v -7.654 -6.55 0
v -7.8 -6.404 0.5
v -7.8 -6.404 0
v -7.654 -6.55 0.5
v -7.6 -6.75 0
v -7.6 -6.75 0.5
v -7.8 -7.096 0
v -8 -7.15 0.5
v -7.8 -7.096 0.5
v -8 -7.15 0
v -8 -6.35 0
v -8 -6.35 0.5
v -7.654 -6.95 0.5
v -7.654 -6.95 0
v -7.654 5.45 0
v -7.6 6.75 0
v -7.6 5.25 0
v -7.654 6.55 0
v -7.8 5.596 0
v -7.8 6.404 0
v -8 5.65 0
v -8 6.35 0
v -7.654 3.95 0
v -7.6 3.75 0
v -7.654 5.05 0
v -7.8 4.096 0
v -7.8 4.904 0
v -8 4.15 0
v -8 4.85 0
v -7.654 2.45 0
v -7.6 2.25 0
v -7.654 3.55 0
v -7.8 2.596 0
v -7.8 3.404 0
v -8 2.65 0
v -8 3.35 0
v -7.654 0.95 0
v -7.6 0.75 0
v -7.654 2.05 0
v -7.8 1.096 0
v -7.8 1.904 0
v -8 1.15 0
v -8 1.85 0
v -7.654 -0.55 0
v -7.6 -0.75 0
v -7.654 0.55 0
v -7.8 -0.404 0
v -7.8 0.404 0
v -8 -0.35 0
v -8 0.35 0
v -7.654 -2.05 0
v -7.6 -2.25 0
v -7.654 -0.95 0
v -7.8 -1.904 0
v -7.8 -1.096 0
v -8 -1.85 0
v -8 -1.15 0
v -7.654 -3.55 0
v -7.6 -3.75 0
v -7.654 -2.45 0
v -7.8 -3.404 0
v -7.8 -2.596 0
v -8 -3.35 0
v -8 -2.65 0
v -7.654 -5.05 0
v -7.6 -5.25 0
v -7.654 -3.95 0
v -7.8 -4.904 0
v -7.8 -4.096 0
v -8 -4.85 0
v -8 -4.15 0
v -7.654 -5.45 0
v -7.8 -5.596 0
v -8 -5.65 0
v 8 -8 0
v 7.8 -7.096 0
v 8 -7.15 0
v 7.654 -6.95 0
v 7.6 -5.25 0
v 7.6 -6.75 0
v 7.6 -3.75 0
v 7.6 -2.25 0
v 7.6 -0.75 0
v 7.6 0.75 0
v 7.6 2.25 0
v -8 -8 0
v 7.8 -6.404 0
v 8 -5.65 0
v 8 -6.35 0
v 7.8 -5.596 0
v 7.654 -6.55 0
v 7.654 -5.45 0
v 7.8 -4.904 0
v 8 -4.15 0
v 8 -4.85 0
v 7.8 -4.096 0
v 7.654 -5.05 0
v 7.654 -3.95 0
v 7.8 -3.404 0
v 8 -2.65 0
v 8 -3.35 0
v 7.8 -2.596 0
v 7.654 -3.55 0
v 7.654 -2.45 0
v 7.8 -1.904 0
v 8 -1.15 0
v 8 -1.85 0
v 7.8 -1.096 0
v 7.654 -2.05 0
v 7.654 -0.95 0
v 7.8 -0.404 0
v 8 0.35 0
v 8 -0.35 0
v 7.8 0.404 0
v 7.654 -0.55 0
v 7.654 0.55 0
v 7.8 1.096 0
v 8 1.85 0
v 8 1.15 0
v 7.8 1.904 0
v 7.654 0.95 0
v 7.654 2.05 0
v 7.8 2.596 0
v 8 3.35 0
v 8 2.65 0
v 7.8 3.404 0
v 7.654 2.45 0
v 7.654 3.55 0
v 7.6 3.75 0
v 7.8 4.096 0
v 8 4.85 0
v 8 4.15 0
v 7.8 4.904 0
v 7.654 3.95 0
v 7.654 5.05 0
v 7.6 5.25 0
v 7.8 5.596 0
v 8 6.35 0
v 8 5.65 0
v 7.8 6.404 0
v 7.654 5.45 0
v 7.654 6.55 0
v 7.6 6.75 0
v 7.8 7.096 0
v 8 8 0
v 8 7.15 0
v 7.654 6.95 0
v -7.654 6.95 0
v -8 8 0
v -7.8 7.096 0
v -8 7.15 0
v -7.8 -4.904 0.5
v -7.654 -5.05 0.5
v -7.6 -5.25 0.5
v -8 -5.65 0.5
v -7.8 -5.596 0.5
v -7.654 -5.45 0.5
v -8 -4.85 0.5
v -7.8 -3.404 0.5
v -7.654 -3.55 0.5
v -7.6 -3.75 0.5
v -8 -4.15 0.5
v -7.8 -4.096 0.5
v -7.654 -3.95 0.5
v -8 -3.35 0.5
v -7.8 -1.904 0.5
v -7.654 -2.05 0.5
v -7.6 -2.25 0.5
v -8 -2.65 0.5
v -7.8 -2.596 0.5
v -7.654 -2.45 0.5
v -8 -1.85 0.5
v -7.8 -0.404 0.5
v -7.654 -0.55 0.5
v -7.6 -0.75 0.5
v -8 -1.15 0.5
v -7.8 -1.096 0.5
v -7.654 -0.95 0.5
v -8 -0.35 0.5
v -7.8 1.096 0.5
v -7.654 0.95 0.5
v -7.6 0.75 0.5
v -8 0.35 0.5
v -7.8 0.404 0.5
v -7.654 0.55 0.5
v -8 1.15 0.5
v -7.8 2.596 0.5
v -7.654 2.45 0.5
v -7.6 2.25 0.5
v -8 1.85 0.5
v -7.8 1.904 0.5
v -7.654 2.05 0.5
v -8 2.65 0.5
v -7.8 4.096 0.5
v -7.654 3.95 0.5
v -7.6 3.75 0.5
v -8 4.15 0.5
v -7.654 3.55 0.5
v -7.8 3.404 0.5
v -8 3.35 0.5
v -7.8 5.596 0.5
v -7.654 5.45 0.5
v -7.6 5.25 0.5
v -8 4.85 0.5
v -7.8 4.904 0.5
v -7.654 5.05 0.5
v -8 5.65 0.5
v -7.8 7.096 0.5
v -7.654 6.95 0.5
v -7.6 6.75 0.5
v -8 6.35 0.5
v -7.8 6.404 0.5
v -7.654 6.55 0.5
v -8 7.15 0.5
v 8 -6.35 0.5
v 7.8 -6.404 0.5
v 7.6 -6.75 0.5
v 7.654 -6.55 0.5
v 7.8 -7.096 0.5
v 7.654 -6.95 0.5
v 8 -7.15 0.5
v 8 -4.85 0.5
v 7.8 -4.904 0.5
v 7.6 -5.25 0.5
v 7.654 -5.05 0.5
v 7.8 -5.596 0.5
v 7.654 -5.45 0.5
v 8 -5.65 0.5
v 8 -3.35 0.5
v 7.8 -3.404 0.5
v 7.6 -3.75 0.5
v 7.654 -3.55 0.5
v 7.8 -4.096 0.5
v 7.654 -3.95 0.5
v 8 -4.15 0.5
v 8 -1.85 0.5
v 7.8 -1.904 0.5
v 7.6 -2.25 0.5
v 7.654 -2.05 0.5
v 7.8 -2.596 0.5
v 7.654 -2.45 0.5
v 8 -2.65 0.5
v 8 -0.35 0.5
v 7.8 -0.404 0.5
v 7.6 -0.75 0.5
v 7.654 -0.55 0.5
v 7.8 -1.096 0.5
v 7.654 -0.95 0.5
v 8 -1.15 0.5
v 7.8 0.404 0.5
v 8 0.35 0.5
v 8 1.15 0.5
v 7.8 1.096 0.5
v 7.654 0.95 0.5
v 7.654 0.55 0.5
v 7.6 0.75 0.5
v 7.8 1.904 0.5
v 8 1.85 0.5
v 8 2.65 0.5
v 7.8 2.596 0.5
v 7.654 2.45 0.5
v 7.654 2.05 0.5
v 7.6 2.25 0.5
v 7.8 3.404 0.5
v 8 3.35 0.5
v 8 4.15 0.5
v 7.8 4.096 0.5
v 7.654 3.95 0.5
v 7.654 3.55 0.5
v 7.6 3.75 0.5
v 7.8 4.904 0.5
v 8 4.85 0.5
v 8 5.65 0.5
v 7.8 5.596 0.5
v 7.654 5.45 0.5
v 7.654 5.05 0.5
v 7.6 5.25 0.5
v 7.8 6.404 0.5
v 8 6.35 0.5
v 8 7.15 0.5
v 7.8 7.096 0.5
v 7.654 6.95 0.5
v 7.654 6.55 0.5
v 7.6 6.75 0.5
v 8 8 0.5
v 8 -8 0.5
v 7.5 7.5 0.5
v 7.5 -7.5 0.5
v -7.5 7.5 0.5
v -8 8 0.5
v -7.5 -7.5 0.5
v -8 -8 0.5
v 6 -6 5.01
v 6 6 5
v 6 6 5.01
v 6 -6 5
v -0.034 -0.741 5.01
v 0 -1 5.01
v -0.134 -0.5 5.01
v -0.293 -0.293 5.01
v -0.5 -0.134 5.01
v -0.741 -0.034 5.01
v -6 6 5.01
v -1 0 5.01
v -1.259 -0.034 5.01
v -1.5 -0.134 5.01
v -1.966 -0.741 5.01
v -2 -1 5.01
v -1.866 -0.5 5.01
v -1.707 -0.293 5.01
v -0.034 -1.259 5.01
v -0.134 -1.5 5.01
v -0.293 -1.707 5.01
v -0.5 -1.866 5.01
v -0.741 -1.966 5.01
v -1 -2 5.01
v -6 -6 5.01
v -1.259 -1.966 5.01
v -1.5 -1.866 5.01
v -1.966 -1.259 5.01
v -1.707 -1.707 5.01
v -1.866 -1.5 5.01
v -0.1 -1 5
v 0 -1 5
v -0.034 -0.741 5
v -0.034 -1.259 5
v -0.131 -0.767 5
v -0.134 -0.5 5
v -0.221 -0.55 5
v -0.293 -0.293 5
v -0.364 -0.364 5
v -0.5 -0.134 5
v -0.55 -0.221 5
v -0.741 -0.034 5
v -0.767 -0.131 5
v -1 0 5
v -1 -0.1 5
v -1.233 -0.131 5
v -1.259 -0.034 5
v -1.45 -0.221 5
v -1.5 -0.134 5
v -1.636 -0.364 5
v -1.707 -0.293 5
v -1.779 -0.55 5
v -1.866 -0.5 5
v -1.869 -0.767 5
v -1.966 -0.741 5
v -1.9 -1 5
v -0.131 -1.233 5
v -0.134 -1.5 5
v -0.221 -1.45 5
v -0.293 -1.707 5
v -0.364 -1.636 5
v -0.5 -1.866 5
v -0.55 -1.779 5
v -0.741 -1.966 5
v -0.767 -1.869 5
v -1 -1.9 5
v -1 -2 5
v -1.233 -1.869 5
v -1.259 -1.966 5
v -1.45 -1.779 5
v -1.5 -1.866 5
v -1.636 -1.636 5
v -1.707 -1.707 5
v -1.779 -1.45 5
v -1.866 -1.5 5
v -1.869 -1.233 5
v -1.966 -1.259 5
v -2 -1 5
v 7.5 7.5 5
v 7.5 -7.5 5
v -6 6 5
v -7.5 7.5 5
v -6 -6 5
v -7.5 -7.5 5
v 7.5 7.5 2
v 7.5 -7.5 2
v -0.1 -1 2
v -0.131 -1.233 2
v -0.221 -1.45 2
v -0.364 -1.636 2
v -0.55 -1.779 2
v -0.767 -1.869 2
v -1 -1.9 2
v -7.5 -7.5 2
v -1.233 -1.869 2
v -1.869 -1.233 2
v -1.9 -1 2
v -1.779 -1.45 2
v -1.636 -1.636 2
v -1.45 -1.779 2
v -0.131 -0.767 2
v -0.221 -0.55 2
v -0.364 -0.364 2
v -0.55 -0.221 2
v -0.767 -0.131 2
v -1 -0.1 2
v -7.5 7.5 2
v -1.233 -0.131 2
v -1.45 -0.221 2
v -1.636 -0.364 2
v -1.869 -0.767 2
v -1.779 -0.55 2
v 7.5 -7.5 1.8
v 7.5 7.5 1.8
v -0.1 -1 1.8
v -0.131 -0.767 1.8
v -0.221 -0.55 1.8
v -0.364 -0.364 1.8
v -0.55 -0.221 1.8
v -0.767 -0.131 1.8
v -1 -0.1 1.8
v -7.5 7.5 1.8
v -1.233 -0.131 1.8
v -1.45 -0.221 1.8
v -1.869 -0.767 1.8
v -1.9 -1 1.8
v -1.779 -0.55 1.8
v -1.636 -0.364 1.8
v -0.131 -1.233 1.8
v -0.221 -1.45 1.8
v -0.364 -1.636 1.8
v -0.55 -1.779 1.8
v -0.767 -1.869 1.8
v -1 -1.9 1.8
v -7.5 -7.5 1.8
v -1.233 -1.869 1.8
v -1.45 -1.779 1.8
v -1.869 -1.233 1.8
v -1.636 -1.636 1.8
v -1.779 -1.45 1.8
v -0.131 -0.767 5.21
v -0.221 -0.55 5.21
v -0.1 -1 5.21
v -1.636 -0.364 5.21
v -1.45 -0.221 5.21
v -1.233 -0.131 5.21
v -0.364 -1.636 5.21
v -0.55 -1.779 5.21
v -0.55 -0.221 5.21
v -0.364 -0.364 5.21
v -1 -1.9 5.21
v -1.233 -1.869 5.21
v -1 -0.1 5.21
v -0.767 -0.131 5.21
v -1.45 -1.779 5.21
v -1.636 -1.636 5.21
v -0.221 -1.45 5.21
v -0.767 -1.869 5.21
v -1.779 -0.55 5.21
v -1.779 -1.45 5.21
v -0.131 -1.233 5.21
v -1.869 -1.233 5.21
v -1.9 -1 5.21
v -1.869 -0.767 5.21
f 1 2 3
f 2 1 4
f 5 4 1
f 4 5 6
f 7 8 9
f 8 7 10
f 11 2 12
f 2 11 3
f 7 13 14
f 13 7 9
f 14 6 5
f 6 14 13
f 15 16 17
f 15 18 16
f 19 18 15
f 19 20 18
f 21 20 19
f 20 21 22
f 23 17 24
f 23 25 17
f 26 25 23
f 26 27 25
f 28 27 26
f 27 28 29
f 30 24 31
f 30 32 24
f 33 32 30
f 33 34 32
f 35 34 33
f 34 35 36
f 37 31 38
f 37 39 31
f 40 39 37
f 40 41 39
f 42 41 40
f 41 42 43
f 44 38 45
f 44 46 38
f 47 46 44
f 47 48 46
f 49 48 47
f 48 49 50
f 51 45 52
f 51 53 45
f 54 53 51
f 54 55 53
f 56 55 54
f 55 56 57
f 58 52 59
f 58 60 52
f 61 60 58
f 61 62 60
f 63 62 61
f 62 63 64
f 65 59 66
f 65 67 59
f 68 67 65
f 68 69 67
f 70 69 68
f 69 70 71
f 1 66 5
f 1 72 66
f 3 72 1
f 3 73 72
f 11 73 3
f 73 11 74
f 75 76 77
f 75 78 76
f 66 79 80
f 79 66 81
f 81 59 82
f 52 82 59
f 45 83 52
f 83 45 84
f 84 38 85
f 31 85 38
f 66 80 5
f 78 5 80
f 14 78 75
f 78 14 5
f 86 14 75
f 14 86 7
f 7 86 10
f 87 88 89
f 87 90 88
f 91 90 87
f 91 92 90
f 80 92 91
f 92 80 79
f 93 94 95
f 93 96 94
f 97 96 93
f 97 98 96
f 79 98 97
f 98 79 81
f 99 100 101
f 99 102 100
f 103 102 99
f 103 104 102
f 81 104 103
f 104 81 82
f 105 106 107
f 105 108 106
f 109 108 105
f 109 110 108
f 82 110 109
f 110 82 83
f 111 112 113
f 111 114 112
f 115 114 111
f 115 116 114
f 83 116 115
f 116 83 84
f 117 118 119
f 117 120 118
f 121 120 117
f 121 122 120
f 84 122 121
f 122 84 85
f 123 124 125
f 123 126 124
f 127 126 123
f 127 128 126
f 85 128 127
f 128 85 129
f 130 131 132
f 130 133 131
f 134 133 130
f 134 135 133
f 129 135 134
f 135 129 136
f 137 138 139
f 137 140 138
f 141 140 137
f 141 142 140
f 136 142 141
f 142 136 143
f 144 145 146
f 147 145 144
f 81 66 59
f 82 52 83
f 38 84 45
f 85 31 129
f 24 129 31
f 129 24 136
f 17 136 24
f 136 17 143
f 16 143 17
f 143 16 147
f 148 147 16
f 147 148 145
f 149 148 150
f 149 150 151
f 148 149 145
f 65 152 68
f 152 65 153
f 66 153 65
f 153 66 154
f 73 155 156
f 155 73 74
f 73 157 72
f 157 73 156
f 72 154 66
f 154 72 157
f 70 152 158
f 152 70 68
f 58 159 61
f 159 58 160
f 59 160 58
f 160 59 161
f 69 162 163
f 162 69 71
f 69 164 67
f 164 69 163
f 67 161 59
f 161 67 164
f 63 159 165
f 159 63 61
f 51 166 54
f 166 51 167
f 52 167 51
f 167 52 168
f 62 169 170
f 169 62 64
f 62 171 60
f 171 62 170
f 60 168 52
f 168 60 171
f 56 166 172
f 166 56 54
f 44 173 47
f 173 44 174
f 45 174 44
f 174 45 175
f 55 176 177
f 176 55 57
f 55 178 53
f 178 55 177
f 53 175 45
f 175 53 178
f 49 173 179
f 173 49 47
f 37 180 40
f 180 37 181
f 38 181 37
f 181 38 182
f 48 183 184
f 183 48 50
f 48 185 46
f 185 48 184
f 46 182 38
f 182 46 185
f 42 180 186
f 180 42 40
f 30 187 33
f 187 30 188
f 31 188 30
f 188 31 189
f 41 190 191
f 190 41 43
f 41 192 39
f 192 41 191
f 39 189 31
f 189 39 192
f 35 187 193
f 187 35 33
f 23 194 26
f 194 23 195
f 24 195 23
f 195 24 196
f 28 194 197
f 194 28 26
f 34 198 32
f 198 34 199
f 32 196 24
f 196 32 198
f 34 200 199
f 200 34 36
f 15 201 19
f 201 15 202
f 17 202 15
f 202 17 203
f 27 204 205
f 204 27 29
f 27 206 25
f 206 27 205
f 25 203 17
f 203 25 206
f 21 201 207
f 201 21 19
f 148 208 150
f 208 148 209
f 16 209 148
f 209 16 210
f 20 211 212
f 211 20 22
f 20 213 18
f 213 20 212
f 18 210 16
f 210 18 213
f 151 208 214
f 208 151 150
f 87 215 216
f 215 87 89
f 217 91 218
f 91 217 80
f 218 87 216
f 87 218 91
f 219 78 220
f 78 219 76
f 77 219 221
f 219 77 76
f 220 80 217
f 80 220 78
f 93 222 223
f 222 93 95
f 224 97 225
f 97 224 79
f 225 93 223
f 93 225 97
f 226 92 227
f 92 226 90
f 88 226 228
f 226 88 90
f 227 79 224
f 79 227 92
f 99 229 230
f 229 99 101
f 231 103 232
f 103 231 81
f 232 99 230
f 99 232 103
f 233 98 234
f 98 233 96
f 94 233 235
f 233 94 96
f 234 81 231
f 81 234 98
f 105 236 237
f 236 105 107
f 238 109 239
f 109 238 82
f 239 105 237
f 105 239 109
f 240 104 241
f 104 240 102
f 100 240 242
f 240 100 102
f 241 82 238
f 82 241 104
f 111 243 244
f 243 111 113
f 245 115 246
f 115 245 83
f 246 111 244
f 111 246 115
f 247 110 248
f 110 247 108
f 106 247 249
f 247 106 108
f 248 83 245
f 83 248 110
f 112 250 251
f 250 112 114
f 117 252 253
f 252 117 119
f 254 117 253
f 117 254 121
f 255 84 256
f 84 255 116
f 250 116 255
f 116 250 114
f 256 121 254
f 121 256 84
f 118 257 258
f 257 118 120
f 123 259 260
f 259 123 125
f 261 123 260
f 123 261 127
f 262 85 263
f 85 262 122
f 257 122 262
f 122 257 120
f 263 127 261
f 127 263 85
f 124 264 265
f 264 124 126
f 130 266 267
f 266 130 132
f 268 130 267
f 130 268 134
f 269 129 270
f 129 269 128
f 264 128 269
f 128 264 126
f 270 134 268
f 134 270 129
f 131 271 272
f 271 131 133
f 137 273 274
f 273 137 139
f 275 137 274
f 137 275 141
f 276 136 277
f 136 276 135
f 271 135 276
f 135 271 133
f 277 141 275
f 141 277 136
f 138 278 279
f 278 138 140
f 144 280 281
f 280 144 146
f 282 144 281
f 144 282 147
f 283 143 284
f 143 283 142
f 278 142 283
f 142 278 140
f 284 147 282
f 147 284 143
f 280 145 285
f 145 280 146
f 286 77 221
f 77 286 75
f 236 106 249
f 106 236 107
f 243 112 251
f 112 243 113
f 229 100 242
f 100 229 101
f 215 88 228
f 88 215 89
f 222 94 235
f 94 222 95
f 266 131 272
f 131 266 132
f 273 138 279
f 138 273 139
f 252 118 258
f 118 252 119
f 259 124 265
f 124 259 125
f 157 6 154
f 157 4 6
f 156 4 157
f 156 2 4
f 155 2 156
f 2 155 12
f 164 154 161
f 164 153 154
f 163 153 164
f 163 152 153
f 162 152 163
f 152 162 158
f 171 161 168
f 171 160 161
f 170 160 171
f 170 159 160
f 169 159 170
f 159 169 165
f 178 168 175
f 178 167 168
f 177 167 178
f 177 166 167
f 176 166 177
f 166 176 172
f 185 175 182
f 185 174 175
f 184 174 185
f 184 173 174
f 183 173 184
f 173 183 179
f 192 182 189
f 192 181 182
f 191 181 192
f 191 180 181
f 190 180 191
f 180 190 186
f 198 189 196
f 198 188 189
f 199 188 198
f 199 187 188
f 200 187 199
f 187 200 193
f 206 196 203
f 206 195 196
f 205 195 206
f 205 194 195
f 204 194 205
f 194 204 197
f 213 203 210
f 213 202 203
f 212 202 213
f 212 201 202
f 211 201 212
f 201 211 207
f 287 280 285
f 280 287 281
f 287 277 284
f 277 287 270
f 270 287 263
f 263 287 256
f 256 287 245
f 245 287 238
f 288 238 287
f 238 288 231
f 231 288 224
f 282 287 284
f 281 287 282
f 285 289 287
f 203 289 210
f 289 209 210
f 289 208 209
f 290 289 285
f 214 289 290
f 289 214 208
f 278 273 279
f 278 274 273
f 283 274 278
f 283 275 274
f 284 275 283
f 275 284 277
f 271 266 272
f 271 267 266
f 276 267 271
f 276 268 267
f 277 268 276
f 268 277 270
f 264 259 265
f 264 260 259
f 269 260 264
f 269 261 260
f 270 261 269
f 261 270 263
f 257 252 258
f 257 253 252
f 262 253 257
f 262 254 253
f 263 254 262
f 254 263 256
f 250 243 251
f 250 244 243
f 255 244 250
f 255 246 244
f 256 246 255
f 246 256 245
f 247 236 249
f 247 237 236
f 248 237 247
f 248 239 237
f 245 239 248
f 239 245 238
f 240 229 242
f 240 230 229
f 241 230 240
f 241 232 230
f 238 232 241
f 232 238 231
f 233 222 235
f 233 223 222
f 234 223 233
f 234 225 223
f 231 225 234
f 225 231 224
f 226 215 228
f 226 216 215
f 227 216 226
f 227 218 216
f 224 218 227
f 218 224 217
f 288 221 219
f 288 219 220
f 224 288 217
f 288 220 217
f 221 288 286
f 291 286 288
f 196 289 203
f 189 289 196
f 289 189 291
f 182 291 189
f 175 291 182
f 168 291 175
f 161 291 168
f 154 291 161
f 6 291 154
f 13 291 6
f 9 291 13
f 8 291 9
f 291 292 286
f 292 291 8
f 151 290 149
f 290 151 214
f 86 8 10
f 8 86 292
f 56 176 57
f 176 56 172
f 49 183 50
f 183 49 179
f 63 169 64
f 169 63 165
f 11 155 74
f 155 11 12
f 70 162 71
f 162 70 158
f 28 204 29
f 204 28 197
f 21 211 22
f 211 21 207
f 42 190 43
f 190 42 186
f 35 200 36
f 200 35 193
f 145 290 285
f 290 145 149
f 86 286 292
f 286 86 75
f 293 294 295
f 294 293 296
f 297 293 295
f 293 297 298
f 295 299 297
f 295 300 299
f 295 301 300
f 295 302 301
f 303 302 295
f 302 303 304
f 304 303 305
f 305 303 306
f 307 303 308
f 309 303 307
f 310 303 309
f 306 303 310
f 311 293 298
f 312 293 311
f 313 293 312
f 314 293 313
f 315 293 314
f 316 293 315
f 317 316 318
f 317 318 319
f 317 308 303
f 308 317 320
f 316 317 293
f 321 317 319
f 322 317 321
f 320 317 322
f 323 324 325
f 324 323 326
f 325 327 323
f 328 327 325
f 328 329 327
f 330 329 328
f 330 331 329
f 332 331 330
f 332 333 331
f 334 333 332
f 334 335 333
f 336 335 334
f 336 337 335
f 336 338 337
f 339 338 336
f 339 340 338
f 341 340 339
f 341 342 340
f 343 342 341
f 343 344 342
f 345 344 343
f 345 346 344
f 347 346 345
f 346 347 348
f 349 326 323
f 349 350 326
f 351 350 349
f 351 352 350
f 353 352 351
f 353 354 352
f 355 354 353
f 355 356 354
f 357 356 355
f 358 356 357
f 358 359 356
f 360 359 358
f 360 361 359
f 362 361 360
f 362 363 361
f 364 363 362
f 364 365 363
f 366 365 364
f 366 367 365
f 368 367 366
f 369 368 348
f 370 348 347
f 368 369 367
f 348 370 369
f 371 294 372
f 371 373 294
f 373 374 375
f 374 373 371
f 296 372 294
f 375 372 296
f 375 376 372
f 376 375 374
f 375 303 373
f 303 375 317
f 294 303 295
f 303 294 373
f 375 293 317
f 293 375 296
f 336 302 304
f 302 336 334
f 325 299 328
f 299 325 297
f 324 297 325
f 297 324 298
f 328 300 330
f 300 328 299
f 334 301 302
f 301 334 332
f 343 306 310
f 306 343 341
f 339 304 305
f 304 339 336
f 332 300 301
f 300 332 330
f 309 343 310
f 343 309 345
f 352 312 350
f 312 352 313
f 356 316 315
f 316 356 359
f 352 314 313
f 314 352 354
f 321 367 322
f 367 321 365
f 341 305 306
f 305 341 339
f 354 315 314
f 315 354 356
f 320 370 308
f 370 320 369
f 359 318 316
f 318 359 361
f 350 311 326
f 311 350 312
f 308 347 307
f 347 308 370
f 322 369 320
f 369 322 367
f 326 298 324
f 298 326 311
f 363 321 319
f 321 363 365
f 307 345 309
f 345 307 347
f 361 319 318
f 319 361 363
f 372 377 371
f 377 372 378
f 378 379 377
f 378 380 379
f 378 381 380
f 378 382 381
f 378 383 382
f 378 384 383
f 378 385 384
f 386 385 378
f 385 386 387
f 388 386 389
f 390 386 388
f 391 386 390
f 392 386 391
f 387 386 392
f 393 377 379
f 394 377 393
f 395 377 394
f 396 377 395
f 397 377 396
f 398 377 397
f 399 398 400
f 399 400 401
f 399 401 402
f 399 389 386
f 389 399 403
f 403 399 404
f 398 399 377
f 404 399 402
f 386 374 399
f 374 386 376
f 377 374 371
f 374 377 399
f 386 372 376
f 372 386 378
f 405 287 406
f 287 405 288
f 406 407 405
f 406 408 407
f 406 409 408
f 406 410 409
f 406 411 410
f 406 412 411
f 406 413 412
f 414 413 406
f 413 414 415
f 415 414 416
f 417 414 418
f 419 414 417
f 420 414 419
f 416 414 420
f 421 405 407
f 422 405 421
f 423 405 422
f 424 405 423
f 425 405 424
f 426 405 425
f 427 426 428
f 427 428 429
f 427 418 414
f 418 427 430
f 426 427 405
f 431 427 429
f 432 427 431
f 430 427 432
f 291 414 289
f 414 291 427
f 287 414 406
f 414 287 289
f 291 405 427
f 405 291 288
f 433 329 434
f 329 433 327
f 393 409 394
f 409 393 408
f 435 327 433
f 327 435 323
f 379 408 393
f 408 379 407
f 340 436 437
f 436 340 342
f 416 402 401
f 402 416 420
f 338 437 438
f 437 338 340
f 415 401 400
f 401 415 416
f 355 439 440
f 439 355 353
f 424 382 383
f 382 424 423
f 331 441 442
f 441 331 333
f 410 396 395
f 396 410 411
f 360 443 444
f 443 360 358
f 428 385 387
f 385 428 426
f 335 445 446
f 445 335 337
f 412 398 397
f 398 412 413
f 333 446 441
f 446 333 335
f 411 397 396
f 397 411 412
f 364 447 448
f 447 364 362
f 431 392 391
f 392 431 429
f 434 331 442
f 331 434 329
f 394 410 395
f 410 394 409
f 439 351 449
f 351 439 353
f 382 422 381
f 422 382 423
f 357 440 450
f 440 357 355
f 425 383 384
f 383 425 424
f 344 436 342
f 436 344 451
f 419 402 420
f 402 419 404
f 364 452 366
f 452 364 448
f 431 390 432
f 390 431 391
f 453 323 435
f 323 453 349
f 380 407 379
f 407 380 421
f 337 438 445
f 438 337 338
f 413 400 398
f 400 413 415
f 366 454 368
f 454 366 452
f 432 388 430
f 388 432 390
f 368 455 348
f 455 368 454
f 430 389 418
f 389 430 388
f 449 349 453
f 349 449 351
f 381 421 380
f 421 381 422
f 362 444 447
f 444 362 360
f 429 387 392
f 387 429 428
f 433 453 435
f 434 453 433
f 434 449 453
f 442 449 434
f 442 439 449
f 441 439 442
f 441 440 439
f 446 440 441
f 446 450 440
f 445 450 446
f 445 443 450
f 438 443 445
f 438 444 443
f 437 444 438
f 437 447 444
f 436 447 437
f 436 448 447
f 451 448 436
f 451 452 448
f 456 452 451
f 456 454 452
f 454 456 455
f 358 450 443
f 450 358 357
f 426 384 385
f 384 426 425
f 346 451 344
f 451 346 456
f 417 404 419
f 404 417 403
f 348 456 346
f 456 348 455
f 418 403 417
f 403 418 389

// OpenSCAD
difference() {
translate([-8,-8,0])
color(c=[0,1,0]) {
cube(size=[16,16,0.5]);
}

for(i=[0:9])    
  translate([-8,-6.75+1.5*i,0])
    color(c=[1,1,1]) {
    cylinder (d=0.8,h=1,$fn=12);
    }
for(i=[0:9])    
  translate([8,-6.75+1.5*i,0])
    color(c=[1,1,1]) {
    cylinder (d=0.8,h=1,$fn=12);
    }
}

translate([-7.5,-7.5,2])
color(c=[1,0.8,0.5]) {
cube(size=[15,15,3]);
}

translate([-7.5,-7.5,0.5])
color(c=[0.7,0.7,0.7]) {
cube(size=[15,15,1.3]);
}

difference() {
translate([-6,-6,5])
color(c=[1,1,1]) {
cube(size=[12,12,0.01]);
}

translate([-1,-1,0])
cylinder (d=2,h=6,$fn=24);

}

translate([-1,-1,0.01])
color(c=[0.7,0.7,0.7])
cylinder (d=1.8,h=5.2,$fn=24);
